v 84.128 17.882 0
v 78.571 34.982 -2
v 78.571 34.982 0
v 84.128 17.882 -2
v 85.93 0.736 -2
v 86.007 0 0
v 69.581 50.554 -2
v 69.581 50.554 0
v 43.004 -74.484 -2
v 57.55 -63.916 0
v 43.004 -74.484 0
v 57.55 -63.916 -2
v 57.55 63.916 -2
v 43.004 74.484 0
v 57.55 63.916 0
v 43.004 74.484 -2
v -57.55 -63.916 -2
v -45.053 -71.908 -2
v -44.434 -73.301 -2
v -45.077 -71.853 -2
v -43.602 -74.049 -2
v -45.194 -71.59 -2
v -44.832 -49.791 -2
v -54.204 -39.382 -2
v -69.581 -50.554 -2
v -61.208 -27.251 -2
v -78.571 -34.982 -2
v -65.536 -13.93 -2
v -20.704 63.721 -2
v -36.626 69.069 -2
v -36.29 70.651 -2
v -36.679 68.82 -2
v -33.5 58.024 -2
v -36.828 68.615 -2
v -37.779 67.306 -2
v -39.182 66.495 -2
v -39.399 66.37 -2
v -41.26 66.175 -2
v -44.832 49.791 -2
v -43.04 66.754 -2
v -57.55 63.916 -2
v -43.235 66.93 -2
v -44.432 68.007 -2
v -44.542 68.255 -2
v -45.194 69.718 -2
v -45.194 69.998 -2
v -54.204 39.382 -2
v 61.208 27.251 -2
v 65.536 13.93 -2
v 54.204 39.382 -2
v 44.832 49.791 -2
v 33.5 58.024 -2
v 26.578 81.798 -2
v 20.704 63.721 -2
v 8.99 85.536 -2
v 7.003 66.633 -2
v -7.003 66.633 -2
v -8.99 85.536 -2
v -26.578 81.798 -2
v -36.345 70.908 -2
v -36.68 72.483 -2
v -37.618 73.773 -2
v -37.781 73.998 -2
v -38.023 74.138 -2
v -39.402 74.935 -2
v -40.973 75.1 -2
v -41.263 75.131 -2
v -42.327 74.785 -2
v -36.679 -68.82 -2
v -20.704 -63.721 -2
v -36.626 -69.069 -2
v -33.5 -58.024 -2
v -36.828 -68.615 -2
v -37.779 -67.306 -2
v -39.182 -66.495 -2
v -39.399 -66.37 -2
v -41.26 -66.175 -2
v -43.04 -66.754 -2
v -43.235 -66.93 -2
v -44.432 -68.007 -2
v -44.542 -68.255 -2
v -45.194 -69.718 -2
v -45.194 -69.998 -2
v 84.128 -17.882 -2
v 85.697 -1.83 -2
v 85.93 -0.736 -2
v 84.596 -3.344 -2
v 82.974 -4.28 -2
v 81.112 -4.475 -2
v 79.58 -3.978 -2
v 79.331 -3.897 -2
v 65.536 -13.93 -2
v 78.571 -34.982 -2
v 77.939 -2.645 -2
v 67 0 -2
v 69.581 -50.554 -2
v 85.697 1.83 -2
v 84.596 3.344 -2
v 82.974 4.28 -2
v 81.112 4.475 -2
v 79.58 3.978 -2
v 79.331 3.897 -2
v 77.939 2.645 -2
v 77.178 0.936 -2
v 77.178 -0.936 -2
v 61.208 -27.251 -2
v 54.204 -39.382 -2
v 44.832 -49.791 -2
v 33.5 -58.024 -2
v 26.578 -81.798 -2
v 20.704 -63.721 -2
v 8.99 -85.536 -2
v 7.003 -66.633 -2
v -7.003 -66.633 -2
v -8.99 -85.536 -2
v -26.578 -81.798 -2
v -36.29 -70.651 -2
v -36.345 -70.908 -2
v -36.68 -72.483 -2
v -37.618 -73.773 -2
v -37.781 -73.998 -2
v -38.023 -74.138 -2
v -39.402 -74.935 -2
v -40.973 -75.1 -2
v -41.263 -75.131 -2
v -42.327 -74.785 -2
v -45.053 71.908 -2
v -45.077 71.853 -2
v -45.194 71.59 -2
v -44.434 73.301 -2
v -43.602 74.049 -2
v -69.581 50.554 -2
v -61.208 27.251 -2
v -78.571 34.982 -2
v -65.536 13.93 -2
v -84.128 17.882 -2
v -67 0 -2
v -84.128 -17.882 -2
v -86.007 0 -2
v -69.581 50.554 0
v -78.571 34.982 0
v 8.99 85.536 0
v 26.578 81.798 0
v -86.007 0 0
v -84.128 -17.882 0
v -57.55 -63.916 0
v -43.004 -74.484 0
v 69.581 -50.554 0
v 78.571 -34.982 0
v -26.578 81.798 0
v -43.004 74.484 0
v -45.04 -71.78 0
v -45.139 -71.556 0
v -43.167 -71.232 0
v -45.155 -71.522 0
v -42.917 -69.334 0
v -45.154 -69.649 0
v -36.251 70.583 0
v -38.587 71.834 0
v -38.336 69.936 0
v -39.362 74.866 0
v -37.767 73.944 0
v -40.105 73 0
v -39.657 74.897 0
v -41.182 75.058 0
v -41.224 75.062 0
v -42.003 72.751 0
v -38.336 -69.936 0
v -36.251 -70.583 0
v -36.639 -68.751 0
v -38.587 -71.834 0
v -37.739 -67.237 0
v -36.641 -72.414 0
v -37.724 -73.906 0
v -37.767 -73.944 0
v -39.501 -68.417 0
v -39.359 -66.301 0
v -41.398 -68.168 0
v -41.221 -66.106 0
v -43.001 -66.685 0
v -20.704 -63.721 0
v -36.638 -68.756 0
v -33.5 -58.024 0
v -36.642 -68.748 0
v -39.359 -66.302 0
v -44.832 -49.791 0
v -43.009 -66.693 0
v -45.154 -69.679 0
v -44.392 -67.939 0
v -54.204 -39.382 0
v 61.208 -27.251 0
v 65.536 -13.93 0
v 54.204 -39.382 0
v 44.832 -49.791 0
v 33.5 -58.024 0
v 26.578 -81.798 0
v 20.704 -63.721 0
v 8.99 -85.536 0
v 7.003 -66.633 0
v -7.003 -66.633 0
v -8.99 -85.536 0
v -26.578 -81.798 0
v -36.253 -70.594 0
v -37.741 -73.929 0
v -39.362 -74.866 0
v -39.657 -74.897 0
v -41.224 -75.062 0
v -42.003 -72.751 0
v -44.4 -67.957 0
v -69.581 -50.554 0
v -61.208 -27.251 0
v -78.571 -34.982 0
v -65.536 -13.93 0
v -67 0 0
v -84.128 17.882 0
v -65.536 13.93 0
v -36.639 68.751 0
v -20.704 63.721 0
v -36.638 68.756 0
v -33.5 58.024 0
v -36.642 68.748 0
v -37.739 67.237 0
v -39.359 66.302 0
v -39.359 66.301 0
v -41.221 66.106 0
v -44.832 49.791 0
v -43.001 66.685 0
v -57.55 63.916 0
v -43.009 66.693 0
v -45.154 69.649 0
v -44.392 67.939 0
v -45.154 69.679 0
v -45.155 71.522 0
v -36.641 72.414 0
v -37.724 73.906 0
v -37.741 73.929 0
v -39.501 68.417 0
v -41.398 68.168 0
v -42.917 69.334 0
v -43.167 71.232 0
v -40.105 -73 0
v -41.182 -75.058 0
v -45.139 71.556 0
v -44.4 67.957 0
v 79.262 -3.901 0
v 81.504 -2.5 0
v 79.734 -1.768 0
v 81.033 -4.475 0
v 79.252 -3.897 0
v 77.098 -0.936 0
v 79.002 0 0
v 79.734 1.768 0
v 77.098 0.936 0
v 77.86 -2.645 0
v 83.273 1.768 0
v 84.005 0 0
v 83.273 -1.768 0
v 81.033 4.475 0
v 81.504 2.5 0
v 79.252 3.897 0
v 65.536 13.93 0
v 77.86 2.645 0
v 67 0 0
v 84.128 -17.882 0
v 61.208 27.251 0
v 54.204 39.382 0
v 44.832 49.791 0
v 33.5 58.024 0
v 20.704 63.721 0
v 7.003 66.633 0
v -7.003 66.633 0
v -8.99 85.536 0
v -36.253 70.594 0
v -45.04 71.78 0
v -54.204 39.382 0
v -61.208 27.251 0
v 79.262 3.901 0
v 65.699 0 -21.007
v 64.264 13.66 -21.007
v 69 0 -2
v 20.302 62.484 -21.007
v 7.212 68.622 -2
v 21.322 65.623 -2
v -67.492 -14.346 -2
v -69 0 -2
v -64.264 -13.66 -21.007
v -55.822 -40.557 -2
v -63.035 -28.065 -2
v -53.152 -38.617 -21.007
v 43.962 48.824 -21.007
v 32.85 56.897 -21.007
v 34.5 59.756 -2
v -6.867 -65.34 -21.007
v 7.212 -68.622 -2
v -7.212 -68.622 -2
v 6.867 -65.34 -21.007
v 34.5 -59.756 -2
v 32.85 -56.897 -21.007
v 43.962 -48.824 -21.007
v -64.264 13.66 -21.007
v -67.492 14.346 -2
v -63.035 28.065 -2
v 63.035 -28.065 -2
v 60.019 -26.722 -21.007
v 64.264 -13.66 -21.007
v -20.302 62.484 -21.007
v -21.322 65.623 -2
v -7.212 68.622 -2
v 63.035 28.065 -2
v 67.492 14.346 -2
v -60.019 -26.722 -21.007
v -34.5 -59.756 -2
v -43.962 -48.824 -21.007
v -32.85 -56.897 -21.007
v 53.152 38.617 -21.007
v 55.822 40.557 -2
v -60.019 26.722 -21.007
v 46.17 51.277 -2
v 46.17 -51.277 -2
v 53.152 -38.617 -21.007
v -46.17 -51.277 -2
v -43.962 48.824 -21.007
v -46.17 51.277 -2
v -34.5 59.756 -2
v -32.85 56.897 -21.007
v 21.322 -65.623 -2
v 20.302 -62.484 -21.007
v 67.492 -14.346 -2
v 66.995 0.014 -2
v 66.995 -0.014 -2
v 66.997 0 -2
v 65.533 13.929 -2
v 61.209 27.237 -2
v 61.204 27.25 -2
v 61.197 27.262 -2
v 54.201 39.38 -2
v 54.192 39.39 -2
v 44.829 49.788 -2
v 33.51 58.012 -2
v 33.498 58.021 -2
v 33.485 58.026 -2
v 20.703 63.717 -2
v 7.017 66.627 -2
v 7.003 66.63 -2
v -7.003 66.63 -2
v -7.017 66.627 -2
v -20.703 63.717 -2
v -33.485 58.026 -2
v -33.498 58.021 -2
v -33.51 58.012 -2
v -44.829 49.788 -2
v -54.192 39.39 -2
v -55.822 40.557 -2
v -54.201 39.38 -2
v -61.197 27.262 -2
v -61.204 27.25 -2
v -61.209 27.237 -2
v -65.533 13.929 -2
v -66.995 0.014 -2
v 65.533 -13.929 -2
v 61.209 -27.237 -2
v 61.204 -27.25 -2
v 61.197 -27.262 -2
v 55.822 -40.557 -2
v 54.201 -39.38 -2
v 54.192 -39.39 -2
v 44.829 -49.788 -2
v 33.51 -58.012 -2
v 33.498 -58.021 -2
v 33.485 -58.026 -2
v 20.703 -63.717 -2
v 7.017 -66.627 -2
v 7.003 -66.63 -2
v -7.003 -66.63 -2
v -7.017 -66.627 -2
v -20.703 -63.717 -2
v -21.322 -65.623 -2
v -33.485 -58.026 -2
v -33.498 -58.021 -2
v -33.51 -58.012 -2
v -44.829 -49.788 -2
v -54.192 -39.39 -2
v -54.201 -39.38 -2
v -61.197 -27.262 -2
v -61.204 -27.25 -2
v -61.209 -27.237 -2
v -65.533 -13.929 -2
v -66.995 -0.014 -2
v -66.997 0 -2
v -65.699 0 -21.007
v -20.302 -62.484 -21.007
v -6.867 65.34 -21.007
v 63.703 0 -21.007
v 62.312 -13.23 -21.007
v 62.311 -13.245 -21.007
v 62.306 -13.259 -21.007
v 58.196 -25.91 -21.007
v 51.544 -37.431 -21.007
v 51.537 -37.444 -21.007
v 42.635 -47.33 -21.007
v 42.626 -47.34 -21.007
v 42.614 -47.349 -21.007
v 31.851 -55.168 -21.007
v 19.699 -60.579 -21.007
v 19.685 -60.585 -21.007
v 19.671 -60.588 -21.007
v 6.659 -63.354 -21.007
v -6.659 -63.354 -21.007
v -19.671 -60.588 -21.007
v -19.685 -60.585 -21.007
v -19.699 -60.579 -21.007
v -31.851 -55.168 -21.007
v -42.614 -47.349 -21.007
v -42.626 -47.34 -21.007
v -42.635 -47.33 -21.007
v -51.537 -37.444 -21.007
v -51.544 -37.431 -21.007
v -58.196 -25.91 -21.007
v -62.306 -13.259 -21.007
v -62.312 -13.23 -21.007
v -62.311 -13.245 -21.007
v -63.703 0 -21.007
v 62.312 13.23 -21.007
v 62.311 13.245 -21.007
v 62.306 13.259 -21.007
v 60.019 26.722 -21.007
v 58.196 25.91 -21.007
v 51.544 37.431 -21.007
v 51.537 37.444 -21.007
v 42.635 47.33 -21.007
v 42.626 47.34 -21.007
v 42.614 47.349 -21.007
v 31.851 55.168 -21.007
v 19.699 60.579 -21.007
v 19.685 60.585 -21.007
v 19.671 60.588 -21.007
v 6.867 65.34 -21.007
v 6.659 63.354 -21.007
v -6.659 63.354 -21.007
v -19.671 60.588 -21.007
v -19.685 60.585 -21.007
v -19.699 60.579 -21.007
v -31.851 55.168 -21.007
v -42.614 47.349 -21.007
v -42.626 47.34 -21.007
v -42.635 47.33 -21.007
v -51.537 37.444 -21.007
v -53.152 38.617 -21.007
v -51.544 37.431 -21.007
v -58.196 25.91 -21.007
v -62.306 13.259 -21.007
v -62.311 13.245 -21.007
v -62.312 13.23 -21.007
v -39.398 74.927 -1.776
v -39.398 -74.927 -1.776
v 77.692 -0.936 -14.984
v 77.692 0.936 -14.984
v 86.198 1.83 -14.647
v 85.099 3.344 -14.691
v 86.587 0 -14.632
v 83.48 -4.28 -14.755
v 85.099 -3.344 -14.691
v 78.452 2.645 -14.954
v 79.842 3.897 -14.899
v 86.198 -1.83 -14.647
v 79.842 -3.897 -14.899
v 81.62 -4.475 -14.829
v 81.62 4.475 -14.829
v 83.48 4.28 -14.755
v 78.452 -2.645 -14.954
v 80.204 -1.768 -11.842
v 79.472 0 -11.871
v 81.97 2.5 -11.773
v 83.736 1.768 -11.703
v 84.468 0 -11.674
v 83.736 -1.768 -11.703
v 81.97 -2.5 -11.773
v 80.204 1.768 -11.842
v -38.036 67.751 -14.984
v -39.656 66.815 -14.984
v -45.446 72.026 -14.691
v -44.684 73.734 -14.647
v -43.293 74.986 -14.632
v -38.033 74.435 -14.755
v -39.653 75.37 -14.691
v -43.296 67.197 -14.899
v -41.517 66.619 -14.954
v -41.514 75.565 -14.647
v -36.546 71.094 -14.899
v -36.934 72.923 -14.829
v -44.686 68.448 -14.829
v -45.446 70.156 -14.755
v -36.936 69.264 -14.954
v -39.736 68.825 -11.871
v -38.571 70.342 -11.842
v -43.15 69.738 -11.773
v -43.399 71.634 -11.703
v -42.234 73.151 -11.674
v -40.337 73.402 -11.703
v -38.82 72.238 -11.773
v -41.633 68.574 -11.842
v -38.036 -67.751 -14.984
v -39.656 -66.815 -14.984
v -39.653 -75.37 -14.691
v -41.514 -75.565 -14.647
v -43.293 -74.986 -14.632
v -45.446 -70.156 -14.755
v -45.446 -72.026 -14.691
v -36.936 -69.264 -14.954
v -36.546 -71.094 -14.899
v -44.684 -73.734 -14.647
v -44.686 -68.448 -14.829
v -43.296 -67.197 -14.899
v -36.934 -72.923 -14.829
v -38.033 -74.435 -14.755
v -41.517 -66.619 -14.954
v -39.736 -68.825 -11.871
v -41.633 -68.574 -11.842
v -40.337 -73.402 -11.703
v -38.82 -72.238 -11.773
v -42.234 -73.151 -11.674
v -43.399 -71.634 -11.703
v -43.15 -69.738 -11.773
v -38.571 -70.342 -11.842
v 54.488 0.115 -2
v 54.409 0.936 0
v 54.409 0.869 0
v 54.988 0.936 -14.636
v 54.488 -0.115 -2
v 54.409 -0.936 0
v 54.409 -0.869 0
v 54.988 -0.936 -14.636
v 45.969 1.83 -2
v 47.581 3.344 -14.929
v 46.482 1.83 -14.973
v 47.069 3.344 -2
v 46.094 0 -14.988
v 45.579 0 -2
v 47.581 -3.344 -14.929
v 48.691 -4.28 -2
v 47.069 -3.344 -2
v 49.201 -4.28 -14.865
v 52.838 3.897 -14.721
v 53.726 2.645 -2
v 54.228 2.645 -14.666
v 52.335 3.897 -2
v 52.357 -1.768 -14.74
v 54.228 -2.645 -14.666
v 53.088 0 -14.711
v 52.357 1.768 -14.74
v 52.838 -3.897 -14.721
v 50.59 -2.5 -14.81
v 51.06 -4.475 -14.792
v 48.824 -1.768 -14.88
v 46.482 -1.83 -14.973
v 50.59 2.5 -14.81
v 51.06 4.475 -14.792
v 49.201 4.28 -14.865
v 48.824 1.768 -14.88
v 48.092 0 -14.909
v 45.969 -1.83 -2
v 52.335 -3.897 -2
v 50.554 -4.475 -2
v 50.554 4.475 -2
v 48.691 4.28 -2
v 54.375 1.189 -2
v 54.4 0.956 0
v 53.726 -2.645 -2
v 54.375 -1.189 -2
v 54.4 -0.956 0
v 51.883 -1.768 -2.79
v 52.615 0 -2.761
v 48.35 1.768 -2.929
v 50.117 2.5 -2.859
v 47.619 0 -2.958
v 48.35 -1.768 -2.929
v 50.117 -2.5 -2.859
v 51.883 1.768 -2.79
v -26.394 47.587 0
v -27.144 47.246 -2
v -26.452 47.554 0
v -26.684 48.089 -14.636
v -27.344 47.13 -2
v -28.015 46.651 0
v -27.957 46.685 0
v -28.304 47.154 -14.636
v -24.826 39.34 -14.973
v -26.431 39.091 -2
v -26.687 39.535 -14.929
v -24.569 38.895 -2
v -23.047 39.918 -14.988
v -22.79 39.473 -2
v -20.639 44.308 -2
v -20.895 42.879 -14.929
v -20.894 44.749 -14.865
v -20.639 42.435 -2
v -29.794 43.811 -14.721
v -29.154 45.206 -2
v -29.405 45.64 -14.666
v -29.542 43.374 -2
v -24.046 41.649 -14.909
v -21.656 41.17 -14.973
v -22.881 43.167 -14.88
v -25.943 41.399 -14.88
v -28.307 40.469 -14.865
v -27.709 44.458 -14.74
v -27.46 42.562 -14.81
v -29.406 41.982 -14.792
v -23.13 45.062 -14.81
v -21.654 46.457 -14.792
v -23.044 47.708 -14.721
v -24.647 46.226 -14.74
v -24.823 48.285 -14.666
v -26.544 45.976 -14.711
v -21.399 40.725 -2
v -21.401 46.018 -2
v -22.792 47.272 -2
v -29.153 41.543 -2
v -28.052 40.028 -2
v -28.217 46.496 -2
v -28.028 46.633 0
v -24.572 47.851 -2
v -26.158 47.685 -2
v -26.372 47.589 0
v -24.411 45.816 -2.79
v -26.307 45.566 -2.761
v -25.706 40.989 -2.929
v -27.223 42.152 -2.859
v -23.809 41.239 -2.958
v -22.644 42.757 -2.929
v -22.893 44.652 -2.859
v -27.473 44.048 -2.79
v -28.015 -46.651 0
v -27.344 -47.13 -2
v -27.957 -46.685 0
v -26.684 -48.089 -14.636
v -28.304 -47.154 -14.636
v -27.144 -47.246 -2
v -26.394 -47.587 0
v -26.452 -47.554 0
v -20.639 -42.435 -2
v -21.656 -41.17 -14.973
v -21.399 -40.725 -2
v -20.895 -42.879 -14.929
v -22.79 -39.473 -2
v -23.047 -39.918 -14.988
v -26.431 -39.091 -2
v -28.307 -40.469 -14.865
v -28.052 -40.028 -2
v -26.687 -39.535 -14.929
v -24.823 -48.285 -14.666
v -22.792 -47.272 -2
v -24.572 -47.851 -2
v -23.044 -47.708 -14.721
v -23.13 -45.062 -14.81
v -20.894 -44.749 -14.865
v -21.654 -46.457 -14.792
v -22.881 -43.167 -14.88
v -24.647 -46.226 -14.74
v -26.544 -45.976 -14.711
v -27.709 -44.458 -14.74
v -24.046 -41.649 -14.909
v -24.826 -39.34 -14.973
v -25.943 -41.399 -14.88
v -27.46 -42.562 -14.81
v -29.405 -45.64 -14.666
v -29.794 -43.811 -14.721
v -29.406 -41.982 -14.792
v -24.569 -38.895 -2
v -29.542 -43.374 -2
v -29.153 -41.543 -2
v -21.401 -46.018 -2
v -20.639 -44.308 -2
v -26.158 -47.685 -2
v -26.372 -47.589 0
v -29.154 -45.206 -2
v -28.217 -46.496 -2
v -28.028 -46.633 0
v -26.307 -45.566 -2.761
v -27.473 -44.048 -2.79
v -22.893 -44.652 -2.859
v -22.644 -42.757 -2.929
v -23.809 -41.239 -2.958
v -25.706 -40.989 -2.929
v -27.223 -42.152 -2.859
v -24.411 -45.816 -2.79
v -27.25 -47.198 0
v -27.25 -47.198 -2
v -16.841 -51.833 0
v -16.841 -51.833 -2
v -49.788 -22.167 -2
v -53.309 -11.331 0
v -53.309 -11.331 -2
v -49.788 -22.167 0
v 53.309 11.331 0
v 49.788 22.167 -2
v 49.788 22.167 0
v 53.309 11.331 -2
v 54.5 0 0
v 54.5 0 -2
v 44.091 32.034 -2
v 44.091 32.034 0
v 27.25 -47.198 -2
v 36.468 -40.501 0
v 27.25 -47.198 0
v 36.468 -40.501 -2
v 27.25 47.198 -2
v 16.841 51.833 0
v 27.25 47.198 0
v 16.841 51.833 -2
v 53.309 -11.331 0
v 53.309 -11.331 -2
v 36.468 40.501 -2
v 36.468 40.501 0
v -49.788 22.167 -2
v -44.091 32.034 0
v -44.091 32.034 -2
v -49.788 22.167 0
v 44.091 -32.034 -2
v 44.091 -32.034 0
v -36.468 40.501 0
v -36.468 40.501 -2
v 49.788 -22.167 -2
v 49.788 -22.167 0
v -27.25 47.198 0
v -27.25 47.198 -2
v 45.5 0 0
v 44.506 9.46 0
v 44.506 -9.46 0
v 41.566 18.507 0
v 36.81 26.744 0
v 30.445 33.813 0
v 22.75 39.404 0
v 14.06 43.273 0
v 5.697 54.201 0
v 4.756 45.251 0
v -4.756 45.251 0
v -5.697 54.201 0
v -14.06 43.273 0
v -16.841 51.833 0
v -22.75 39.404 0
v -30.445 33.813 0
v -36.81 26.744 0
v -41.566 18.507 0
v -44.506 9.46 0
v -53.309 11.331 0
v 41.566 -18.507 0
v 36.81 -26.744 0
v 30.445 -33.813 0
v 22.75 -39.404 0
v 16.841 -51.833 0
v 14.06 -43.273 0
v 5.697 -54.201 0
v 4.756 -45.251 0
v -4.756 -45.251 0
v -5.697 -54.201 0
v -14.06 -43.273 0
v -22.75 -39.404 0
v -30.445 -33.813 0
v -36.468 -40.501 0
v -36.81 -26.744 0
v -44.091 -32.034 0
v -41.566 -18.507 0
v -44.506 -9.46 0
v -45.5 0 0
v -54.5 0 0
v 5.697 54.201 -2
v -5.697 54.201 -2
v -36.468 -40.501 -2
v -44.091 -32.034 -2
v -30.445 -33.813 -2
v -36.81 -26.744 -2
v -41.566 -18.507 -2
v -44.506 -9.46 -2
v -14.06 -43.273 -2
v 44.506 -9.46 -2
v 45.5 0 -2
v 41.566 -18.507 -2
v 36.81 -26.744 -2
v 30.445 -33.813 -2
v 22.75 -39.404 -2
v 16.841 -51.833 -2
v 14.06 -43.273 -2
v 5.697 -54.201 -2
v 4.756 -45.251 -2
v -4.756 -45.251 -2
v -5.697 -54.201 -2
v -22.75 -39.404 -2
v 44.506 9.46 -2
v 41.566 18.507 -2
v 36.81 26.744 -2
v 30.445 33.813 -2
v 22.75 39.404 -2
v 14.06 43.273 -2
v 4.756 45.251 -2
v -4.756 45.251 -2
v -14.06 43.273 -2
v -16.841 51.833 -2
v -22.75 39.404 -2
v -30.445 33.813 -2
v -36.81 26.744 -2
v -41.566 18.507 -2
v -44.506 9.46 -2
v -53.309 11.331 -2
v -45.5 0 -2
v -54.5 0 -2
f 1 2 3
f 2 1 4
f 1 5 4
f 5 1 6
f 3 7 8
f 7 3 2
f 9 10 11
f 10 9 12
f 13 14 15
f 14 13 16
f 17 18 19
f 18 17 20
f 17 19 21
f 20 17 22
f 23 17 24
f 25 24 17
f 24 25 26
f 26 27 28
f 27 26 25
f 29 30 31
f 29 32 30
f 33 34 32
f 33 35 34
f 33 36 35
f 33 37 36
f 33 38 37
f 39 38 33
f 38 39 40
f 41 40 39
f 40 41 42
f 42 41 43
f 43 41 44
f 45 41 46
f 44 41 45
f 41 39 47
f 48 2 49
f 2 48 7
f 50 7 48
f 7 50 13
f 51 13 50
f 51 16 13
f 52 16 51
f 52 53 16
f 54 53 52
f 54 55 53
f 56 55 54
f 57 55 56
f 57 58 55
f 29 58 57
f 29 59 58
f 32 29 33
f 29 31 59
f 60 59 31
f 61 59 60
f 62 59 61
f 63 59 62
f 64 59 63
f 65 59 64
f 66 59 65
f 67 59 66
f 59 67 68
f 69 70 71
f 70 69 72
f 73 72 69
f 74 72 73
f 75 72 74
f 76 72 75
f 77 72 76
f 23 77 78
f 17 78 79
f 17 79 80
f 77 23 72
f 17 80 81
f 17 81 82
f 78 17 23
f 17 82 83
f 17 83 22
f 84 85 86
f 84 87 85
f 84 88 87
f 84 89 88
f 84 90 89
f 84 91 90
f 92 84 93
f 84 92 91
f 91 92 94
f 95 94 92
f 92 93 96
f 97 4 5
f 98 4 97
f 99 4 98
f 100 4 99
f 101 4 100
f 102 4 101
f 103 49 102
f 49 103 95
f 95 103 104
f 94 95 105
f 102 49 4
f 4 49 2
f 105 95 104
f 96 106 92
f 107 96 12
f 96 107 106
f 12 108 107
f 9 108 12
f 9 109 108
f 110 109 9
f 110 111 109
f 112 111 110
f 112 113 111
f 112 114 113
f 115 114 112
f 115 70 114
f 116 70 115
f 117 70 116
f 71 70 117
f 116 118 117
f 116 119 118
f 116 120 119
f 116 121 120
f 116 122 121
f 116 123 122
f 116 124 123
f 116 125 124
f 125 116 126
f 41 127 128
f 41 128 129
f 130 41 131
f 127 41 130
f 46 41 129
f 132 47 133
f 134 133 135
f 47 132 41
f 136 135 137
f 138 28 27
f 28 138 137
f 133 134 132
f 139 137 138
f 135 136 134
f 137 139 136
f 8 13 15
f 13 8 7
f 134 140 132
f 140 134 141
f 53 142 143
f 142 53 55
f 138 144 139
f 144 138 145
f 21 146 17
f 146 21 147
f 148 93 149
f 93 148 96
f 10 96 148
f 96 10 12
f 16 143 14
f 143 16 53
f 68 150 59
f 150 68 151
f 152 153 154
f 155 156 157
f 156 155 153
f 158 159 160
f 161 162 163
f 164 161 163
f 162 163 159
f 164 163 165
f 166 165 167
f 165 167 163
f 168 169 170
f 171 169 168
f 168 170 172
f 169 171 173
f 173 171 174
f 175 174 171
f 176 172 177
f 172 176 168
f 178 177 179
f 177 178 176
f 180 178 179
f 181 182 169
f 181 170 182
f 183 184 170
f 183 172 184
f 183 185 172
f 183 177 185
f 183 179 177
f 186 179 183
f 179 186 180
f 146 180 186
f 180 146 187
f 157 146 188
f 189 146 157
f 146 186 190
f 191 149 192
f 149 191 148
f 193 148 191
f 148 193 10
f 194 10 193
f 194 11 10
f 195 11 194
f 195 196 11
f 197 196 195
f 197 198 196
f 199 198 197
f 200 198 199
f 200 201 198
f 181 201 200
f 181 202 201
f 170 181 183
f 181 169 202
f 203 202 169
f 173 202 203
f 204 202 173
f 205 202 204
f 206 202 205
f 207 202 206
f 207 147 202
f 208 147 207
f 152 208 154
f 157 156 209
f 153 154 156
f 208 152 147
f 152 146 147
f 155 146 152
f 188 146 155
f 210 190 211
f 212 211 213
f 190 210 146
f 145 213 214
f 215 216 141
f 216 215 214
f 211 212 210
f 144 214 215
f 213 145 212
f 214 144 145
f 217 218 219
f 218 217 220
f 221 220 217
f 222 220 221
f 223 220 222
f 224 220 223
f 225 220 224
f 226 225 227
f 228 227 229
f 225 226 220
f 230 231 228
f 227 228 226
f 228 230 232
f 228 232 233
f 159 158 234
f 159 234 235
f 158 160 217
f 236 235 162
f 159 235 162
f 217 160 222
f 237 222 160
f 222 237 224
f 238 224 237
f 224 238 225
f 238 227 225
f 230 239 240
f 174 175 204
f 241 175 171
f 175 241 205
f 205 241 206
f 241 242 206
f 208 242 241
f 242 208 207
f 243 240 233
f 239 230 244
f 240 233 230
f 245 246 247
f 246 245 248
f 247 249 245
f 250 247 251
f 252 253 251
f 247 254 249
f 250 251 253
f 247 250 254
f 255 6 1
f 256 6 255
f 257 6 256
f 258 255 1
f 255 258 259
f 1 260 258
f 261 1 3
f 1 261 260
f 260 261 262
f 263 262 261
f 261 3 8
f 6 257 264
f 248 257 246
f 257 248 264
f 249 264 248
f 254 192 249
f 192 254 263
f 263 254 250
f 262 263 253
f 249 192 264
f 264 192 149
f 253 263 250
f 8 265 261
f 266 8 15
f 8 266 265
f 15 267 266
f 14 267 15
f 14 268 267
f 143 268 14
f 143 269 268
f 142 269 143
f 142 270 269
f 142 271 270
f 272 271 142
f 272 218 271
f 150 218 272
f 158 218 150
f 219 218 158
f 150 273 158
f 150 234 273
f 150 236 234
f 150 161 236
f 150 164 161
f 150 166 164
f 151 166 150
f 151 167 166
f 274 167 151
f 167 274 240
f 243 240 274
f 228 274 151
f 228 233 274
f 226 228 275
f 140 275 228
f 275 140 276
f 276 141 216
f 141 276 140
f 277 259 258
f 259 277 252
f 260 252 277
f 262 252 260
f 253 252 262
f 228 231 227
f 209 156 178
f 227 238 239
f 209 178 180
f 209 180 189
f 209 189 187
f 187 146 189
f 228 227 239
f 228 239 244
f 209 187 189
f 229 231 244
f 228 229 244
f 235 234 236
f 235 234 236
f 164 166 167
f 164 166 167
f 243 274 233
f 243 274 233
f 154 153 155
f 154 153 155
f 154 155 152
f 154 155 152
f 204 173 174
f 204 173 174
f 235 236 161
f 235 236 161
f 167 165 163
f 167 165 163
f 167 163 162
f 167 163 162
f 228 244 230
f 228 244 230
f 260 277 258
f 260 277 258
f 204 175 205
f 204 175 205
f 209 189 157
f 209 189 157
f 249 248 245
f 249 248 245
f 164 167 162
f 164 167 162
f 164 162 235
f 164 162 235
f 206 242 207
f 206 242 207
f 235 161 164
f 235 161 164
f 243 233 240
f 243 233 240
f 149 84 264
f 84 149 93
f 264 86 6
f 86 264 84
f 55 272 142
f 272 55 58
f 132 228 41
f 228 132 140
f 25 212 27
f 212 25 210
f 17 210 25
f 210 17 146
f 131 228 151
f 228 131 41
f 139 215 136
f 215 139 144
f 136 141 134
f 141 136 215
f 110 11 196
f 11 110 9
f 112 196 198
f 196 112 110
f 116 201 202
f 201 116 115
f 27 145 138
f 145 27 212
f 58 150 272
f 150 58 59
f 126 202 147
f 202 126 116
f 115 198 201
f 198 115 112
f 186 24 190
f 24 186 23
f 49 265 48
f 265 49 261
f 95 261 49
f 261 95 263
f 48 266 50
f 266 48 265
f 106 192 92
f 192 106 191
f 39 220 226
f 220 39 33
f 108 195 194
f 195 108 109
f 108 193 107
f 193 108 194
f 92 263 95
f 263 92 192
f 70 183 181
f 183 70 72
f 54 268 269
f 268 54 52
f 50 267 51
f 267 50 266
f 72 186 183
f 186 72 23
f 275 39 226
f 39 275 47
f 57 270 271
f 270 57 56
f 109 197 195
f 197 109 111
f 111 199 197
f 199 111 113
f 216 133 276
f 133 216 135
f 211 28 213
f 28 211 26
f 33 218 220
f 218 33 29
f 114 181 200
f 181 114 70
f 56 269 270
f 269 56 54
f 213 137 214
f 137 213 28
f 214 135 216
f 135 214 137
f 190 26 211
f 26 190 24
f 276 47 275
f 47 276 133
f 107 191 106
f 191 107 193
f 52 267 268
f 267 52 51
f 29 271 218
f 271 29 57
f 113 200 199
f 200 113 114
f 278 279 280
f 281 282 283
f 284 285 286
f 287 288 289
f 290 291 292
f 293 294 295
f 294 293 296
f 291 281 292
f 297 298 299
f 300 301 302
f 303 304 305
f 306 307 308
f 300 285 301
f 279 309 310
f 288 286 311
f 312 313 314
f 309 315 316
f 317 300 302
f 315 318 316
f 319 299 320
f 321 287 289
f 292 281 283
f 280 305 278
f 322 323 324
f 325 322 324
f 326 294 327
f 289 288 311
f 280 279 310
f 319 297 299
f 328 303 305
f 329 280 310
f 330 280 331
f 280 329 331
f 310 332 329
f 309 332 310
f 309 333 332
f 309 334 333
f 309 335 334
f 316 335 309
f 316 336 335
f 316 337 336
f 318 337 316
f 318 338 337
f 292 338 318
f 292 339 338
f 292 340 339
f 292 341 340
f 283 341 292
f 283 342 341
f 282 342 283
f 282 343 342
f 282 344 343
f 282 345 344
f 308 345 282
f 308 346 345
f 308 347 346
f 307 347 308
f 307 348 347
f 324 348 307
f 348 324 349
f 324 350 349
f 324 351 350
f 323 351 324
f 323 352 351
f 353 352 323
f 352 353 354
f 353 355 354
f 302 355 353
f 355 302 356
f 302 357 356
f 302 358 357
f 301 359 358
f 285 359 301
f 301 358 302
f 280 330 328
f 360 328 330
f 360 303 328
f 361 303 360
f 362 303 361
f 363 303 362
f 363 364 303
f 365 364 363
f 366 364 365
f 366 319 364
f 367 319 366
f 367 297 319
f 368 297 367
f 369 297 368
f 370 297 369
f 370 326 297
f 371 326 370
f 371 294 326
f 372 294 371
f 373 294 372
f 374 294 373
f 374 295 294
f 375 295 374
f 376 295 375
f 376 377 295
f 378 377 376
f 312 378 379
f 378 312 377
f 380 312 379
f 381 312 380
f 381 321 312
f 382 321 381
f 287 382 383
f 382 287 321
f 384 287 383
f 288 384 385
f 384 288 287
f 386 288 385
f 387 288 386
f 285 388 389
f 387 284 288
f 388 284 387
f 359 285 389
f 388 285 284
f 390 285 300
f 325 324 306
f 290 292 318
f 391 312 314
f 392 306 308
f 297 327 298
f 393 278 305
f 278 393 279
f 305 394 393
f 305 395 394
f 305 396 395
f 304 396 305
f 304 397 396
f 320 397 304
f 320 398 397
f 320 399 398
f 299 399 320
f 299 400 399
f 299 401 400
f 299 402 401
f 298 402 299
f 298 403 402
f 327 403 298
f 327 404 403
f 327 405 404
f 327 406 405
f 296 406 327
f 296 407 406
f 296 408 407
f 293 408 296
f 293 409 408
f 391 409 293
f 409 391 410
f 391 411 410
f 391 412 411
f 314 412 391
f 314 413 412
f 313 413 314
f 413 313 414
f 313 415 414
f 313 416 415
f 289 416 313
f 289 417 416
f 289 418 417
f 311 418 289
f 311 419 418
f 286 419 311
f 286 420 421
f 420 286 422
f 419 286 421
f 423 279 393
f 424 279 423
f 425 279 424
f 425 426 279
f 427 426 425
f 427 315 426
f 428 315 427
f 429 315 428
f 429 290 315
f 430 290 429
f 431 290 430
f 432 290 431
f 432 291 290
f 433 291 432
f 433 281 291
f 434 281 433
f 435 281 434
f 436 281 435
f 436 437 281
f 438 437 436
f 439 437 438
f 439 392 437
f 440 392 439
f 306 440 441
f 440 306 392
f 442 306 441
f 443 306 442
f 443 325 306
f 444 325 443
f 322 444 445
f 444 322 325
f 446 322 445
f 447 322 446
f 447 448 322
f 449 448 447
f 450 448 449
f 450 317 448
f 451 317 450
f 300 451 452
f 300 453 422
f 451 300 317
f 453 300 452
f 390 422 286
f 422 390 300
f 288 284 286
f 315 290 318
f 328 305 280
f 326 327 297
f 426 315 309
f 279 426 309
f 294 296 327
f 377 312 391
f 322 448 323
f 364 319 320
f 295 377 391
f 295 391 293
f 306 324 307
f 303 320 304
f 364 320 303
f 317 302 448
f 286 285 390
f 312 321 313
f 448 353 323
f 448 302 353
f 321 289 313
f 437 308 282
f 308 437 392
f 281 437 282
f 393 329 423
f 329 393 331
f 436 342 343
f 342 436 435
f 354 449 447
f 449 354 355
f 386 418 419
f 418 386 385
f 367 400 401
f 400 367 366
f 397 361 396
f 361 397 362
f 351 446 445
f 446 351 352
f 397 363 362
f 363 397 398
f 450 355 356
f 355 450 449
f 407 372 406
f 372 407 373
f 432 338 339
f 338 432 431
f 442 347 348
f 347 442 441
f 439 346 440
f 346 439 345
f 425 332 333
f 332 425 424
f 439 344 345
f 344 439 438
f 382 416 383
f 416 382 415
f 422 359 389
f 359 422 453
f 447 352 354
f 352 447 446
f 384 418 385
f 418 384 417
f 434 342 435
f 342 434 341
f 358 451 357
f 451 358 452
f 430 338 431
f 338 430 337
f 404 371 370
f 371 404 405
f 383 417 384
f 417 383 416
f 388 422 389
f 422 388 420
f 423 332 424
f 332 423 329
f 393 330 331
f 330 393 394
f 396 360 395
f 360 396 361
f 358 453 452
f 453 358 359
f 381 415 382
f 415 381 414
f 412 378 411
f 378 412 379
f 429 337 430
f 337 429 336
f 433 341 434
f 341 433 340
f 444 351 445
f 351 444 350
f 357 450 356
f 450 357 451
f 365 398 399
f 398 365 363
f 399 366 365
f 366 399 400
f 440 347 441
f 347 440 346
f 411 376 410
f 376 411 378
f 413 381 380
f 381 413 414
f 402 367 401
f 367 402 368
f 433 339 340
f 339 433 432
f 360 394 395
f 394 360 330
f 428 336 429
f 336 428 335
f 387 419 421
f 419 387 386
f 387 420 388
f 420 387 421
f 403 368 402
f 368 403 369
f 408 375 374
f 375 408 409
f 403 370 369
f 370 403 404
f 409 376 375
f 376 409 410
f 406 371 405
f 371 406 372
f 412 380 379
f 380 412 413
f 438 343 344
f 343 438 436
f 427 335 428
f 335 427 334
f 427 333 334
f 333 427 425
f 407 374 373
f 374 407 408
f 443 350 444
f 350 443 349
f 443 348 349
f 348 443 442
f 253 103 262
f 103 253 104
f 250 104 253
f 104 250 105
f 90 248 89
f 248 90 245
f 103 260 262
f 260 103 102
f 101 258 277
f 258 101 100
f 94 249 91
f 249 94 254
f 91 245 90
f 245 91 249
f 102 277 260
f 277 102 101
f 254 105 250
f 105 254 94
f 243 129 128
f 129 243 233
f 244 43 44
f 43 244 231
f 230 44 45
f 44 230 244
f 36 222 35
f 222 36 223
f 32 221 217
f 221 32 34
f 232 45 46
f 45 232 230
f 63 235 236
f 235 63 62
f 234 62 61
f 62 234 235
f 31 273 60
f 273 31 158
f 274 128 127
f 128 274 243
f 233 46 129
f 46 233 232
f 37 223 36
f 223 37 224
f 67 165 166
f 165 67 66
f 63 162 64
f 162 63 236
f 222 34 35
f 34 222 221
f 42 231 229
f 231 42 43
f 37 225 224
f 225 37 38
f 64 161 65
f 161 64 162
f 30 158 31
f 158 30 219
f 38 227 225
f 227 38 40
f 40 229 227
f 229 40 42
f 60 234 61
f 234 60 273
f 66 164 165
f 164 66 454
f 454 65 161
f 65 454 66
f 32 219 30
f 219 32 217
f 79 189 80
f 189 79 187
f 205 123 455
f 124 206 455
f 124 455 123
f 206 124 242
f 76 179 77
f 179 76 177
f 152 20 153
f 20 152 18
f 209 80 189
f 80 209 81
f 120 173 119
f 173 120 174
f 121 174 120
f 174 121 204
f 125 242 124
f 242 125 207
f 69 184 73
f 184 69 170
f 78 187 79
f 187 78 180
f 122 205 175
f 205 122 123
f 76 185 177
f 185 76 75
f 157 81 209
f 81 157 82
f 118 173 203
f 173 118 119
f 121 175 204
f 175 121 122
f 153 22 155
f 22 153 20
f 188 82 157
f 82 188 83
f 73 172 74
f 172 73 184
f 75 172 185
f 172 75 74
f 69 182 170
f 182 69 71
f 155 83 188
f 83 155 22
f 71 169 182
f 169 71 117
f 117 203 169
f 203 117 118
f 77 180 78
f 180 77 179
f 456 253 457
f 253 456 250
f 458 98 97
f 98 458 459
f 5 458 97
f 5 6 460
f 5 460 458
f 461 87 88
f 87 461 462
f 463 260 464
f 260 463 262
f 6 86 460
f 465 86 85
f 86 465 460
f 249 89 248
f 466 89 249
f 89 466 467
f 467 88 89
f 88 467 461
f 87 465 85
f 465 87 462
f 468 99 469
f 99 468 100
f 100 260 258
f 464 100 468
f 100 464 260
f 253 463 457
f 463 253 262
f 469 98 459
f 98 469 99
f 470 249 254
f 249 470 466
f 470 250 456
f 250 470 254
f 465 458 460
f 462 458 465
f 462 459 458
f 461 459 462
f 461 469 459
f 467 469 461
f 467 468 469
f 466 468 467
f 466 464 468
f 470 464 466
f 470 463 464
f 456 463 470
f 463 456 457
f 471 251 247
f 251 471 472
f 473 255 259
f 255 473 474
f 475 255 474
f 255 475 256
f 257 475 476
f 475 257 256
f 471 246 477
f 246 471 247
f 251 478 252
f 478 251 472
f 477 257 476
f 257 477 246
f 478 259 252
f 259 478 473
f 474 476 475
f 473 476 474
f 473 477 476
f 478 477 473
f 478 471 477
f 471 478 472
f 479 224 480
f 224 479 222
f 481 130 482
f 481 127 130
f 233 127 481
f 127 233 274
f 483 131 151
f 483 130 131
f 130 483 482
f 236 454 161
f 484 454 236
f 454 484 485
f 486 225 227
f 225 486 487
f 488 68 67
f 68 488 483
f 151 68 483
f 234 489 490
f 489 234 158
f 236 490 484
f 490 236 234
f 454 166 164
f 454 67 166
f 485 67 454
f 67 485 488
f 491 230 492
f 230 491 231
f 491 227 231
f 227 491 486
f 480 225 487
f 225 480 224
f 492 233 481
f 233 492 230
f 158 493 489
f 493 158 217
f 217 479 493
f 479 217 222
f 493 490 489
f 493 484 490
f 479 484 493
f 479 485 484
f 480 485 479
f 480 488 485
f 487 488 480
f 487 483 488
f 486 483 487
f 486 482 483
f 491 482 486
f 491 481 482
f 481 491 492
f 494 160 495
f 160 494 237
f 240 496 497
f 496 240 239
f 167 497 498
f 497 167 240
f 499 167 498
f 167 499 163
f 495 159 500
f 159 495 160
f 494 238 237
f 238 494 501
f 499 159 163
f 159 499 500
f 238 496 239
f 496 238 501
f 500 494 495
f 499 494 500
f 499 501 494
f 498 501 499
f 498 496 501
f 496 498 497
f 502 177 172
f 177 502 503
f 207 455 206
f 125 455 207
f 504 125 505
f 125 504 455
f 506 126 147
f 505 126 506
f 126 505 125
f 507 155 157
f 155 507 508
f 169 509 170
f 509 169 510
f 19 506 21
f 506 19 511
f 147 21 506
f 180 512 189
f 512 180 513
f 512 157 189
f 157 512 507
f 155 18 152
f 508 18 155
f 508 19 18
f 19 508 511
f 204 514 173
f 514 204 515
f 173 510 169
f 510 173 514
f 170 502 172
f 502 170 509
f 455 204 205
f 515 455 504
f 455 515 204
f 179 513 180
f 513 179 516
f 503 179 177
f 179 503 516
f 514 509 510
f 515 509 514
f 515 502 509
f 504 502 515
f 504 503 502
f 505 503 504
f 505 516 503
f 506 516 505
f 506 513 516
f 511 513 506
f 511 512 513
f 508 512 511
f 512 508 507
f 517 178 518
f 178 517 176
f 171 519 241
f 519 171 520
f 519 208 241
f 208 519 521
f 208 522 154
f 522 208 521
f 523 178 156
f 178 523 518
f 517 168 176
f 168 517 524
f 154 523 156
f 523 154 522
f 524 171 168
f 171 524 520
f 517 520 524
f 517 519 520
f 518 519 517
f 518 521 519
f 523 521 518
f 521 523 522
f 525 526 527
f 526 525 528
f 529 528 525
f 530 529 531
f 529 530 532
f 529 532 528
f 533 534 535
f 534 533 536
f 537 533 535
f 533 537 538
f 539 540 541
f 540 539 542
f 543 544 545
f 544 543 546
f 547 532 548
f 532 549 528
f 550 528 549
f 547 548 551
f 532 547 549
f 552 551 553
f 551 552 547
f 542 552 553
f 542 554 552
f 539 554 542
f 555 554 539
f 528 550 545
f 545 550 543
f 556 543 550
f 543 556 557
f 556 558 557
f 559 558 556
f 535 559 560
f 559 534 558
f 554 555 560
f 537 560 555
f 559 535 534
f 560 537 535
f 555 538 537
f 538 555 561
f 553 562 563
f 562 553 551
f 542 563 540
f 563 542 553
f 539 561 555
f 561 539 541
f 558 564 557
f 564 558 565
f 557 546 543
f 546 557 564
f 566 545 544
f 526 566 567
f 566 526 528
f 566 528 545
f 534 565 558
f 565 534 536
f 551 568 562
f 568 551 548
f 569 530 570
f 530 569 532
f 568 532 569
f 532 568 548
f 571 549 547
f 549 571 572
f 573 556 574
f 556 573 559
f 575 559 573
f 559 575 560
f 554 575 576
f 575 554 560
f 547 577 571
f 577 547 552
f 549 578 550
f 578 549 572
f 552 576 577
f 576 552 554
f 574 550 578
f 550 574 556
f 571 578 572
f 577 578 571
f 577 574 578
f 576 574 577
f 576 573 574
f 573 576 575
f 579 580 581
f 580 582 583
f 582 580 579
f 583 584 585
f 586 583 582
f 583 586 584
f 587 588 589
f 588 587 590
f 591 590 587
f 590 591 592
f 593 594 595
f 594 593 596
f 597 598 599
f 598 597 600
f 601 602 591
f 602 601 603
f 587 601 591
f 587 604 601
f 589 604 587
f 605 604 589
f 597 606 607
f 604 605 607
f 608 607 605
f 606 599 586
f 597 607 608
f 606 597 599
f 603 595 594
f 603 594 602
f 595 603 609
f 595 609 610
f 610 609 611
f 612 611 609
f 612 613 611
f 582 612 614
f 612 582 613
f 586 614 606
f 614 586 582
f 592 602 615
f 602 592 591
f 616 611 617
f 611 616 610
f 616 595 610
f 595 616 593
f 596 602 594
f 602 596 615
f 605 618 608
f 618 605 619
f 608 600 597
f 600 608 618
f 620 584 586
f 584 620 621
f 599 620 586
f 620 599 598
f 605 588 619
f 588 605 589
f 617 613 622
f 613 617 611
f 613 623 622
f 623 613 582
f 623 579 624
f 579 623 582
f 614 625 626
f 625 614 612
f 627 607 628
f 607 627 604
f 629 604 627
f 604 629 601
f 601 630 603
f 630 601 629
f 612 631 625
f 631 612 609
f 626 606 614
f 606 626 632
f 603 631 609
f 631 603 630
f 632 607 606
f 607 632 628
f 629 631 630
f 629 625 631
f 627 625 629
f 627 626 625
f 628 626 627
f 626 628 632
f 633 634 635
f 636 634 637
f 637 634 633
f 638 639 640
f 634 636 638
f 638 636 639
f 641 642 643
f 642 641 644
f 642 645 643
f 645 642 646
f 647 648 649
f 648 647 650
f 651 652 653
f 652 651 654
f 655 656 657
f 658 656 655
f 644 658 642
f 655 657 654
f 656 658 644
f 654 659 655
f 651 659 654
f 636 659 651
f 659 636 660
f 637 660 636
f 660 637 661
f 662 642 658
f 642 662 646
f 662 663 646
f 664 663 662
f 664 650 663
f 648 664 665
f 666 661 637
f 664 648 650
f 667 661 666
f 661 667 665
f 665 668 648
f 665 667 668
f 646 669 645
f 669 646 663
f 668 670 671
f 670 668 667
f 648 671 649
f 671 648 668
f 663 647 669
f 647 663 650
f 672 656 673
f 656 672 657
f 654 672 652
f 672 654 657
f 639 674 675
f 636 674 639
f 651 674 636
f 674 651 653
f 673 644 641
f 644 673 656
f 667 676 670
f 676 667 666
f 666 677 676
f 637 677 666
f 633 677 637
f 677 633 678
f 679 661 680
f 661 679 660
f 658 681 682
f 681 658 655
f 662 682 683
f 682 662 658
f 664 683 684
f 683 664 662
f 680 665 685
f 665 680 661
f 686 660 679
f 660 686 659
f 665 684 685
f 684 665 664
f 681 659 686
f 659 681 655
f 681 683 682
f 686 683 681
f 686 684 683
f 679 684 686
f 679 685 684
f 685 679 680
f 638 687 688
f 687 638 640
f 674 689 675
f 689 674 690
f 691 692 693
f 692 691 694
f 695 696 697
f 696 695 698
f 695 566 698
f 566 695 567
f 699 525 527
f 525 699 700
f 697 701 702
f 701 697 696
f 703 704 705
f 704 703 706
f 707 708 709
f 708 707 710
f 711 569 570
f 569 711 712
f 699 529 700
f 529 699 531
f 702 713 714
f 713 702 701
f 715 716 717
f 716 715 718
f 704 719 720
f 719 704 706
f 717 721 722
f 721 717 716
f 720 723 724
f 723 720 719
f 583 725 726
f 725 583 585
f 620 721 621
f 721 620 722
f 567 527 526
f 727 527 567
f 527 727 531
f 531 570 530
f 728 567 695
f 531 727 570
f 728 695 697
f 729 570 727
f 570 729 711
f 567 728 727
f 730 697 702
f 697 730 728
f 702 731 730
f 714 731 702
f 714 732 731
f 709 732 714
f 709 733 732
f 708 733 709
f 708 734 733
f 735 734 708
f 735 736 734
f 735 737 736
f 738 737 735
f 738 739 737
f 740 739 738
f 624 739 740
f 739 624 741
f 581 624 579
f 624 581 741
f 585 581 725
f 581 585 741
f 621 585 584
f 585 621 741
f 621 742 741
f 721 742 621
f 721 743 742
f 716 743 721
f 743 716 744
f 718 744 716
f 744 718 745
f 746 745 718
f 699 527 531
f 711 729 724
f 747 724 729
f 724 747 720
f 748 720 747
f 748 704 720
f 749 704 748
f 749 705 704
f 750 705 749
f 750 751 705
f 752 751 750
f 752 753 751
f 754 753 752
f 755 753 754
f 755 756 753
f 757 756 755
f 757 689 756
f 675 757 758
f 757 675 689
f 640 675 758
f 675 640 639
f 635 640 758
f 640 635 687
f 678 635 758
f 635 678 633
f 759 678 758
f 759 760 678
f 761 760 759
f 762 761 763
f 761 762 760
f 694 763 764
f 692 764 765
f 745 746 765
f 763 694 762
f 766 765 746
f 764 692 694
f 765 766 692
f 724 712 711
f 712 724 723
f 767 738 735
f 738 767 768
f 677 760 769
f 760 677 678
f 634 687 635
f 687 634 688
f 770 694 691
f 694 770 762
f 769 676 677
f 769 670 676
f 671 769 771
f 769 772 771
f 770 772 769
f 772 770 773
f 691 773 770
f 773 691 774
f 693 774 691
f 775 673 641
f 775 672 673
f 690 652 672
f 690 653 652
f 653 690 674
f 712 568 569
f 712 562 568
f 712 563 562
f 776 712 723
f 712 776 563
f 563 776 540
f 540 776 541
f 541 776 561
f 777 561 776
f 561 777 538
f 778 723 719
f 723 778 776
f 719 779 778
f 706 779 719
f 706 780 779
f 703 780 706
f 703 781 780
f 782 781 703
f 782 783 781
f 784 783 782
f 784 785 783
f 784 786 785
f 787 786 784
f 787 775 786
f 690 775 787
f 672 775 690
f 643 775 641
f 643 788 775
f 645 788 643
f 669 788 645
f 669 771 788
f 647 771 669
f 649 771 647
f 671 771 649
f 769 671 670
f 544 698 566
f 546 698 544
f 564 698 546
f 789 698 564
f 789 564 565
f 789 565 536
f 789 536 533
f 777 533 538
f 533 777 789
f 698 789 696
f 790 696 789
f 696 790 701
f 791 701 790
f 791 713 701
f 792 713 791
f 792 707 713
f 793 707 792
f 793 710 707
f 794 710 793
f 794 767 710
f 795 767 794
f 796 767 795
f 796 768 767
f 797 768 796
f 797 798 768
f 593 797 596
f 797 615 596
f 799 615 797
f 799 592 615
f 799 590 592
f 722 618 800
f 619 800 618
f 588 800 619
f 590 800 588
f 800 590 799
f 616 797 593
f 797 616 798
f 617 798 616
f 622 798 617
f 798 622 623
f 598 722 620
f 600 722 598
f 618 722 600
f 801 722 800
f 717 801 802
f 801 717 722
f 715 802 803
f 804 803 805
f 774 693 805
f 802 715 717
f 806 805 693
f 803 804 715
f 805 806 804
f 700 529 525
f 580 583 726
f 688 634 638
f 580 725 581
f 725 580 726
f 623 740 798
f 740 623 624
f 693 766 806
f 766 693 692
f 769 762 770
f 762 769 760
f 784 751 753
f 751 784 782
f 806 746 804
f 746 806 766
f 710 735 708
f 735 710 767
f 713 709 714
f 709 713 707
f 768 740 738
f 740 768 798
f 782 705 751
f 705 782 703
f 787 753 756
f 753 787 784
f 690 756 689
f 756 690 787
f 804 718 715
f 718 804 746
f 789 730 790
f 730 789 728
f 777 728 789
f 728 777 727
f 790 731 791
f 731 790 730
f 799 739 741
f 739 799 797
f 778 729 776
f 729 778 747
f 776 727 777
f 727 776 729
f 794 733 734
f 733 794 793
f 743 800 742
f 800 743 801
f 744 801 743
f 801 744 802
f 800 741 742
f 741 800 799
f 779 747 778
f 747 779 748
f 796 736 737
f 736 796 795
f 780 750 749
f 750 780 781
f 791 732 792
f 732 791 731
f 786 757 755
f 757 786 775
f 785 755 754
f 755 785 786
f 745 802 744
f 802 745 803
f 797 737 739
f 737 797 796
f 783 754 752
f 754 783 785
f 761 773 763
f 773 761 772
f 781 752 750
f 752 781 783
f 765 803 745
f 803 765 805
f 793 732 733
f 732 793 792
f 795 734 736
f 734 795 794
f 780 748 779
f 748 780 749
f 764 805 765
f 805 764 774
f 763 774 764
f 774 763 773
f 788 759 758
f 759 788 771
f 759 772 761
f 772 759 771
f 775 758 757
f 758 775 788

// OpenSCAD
/*
Copyright (C) Saeed Gholami Shahbandi. All rights reserved.
Author: Saeed Gholami Shahbandi (saeed.gh.sh@gmail.com)

This file is part of Arrangement Library.
The of Arrangement Library is free software: you can redistribute it and/or
modify it under the terms of the GNU Lesser General Public License as published
by the Free Software Foundation, either version 3 of the License,
or (at your option) any later version.

This program is distributed in the hope that it will be useful, but WITHOUT ANY
WARRANTY; without even the implied warranty of MERCHANTABILITY or FITNESS FOR A
PARTICULAR PURPOSE. See the GNU Lesser General Public License for more details.

You should have received a copy of the GNU Lesser General Public License along
with this program. If not, see <http://www.gnu.org/licenses/>
*/

/******************************************************************************/
module rodCap(height, rod_radius, thickness, fill_rod_cap)
{
     outer_radius = rod_radius + thickness;
     inner_height = height - thickness;
     difference()
     {
          cylinder(h=height, r=outer_radius, center=true);
          if (!fill_rod_cap)
          {
               translate([0, 0, thickness+tol])
               cylinder(h=inner_height, r=rod_radius, center=true);
          }
     }
}

module baseRing(pot_radius, pot_inclination, thickness, width)
{
     /// Returns a combination of cylinder and a ring
     
     // incline_shrink is the amount that the bottom of the cylinder
     // should move inward to create a conic shape that would fit the
     // inner inclination of the pot.
     incline_shrink = width * sin(pot_inclination);
     translate([0, 0, -thickness])
     union()
     {
          // top ring
          color("Blue", 1.0)
          difference()
          {
               cylinder(h=thickness,
                        r=pot_radius-thickness+width,
                        center=false);
               translate([0, 0, -tol/2])
               cylinder(h=thickness+tol,
                        r=pot_radius-thickness,
                        center=false);
          }
          // inside cylinder
          color("Green", 1.0)
          translate([0, 0, -width])
          difference()
          {
               cylinder(h=width,
                        r1=pot_radius-incline_shrink,
                        r2=pot_radius,
                        center=false);
               translate([0, 0, -tol/2])
               cylinder(h=width+tol,
                        r1=pot_radius-thickness-incline_shrink,
                        r2=pot_radius-thickness,
                        center=false);
          }

     }
}

module rodCapsOnBase(
     rod_radius,
     rod_count,
     rod_cap_height,
     rod_cap_thickness,
     rod_cap_pitch,
     rod_cap_dip,
     rod_cap_offset,
     fill_rod_caps
     ){
     /// Returns a distribution of rod caps aligned to base ring
     start = 0;
     step = 360 / rod_count;
     end = 360 -  step;
     for (theta = [start:step:end])
     {
          rotate([0, 0, theta])
          translate([rod_cap_offset, 0, -rod_cap_dip])
          rotate([0, rod_cap_pitch, 0])
          rodCap(
               height=rod_cap_height,
               rod_radius=rod_radius,
               thickness=rod_cap_thickness,
               fill_rod_cap=fill_rod_caps
               );
     }
}

/******************************************************************************/
// Adding some tolerance for safety and MOSTLY for better visual rendering
// IT IS NOT USED FOR BETTER FITTING OF PARTS
tol = 0.04;

rod_length = 480;                // millimeter
rod_radius = 5/2;                // millimeter
rod_count = 3;                   // count

rod_cap_height = 15;             // millimeter

/// pot_radius: the inner radius of the top of the pot
/// pot_inclination: the angle at the edge of the pot
pot_radius = 138/2;              // millimeter
pot_inclination = 10;            // degrees
pot_thickness = 8;               // millimeter

top_ring_radius = 50;            // millimeter

/// thickness is of the body design throughout
thickness = 2;
/// rod_cap_pitch is the angle of tilting the rod caps so that the
/// bottom and top caps would aling. The angle is caused by the
/// difference in radius of top and bottom rings, but it is also a
/// function of the rods
rod_cap_pitch = asin((pot_radius-top_ring_radius)/rod_length); // deg
/// rod_cap_dip is the translation of the rod caps along -z, so
/// that the lowest part of the cap would align with the top of the
/// base ring
rod_cap_dip = (rod_cap_height/2) * cos(rod_cap_pitch) -
     (rod_radius+thickness) * sin(rod_cap_pitch); // mm
/// bottom_rod_cap_offset is the amount translation away from z-axis
/// so that the space between the most inner side of the bottom rod
/// cap and the cylinder part of the base ring is exactly equal to pot
/// thickness (so that the pot would fit in between)
bottom_rod_cap_offset = pot_radius + pot_thickness +
     (rod_cap_height/2) * sin(rod_cap_pitch) +
     (rod_radius+thickness) * cos(rod_cap_pitch); // mm
/// top_rod_cap_offset is the amount of translation away from z-axis
/// so that the most inner side of the top rod cap aligns with the
/// inside of the top ring
top_rod_cap_offset = top_ring_radius
     + (rod_cap_height/2) * sin(rod_cap_pitch)
     + (rod_radius + thickness) * cos(rod_cap_pitch)
     - (rod_radius + thickness);
/// base_ring_width is the amount the base ring spans, computed to
/// fully cover the rod caps
base_ring_width = pot_thickness + thickness +
     2 * (rod_radius + thickness) / cos(rod_cap_pitch); // millimeter

/******************************************************************************/
// base ring
difference()
{
     union()
     {
          // get the base ring
          difference(){
               baseRing(
                    pot_radius=pot_radius,
                    pot_inclination=pot_inclination,
                    thickness=thickness,
                    width=base_ring_width
                    );
               // cut out holes for rod caps
               rodCapsOnBase(
                    rod_radius=rod_radius,
                    rod_count=rod_count,
                    rod_cap_height=rod_cap_height,
                    rod_cap_thickness=thickness,
                    rod_cap_pitch=-rod_cap_pitch,
                    rod_cap_dip=rod_cap_dip,
                    rod_cap_offset=bottom_rod_cap_offset,
                    fill_rod_caps=true
                    );
          }
          // add rod caps
          color("Red", 1.0)
          rodCapsOnBase(
               rod_radius=rod_radius,
               rod_count=rod_count,
               rod_cap_height=rod_cap_height,
               rod_cap_thickness=thickness,
               rod_cap_pitch=-rod_cap_pitch,
               rod_cap_dip=rod_cap_dip,
               rod_cap_offset=bottom_rod_cap_offset,
               fill_rod_caps=false
               );
     }
     // cut anything above the zero (i.e. the tilted parts of the rod caps)
     color("Blue", 1.0)
     cylinder(h=thickness+rod_cap_height, // going over to be sure
              r=pot_radius+base_ring_width,
              center=false);
}

// top ring
/* translate([0, 0, rod_length - 2 * rod_cap_height]) */
difference()
{
     union()
     {
          // get a ring
          color("Blue", 1.0)
          translate([0,0,-thickness])
          cylinder(h=thickness,
                   r=top_ring_radius + rod_radius + thickness,
                   center=false);
          // add rod caps
          color("Red", 1.0)
          rodCapsOnBase(
               rod_radius=rod_radius,
               rod_count=rod_count,
               rod_cap_height=rod_cap_height,
               rod_cap_thickness=thickness,
               rod_cap_pitch=180-rod_cap_pitch,
               rod_cap_dip=rod_cap_dip,
               rod_cap_offset=top_rod_cap_offset,
               fill_rod_caps=false
               );
     }
     // remove inside disk
     color("Blue", 1.0)
     translate([0, 0, -thickness - tol/2])
     cylinder(h=thickness+tol,
              r=top_ring_radius - rod_radius - thickness,
              center=false);
     // remove anything on top
     color("Blue", 1.0)
     cylinder(h=10*thickness, // going over to be sure
              r=top_ring_radius + rod_radius + rod_cap_height, // going over to be sure
              center=false);
}
